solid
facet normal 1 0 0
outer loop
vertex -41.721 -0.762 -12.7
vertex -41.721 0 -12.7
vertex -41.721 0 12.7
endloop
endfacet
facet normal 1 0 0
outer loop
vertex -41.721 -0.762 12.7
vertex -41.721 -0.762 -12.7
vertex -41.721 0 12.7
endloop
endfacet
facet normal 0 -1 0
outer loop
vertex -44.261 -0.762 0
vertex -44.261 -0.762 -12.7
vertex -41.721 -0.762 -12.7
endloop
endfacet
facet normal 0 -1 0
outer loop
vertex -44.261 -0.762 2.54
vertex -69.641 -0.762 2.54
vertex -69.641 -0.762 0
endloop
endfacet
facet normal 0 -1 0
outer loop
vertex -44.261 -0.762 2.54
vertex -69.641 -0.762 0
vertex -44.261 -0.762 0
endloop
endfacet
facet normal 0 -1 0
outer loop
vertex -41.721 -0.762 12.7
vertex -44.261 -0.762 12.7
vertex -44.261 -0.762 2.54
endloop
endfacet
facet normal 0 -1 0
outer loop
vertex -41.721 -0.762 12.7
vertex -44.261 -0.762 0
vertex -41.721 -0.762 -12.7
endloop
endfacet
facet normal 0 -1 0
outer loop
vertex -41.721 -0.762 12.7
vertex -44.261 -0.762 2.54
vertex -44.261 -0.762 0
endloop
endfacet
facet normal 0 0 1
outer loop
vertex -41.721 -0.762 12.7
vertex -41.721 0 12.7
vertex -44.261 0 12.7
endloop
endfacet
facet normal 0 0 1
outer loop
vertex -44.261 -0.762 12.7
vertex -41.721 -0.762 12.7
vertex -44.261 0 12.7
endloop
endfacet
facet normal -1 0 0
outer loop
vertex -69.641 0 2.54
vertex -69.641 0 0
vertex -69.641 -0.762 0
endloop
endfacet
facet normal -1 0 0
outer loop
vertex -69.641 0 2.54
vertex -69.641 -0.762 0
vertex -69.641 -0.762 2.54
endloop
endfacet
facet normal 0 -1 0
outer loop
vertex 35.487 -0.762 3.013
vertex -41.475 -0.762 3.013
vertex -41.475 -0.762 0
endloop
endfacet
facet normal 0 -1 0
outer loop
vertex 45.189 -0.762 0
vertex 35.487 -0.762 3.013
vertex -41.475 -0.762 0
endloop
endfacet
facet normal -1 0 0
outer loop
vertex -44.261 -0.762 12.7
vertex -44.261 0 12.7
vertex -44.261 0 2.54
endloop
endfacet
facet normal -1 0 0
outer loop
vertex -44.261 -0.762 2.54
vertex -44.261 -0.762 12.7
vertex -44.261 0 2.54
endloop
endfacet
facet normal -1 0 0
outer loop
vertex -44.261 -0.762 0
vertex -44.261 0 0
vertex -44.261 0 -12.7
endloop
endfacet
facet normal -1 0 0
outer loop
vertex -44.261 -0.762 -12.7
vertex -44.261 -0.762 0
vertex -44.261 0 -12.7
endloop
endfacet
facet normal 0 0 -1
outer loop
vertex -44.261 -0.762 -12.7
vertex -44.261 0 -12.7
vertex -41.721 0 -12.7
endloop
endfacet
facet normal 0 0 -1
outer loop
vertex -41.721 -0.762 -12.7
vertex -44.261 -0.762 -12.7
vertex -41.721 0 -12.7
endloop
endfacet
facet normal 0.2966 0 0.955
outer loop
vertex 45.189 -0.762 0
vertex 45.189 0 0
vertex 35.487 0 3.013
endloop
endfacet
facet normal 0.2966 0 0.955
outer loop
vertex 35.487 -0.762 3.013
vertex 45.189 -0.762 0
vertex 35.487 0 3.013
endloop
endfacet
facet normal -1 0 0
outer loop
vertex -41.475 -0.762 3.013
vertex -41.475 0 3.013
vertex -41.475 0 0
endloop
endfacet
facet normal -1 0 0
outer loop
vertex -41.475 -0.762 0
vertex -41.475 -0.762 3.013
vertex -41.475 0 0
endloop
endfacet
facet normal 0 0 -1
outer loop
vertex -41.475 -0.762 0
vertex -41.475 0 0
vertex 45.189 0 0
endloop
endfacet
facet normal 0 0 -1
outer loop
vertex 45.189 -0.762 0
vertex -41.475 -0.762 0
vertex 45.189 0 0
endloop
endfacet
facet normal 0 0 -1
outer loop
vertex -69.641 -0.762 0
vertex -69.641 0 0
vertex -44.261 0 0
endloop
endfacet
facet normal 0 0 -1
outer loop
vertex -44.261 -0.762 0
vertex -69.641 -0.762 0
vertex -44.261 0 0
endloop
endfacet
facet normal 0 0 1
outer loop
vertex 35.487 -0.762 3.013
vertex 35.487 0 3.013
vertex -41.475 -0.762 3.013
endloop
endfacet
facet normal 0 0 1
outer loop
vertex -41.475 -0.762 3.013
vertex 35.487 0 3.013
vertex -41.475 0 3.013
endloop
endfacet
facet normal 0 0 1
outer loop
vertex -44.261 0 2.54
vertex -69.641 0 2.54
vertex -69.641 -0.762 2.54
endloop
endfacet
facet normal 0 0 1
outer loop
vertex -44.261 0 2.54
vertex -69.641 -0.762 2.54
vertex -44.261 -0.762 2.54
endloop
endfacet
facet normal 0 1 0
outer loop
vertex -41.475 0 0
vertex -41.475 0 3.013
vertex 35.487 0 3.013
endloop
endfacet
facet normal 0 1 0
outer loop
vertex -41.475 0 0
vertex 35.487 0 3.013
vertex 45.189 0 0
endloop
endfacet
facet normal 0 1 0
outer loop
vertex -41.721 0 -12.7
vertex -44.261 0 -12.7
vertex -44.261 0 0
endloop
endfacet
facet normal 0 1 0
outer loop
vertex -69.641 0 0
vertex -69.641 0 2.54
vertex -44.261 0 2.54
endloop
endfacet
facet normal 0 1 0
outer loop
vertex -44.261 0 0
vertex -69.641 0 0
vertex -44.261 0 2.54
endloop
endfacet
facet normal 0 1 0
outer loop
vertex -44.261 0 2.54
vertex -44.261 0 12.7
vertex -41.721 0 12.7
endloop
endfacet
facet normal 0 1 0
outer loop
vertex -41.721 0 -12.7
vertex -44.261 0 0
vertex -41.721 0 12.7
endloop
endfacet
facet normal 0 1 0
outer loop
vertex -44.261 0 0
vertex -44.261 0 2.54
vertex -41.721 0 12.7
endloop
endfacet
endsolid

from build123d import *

# Parameters (mm, degrees)
F3_DEPTH = 0.762
F4_DEPTH = 0.762
F0_W     = 25.4
F0_H     = 2.54
F5_DEPTH = 0.762


with BuildPart() as f3:
    # F2 (on Front) → F3 (new body)
    with BuildSketch(Plane.XZ):
        Polygon((-41.475203, 3.01335), (-41.475203, 0), (34.724797, 0), (45.189403, 0), (35.486552, 3.01335), align=None)
    extrude(amount=F3_DEPTH)


with BuildPart() as f4:
    # F1 (on Front) → F4 (new body)
    with BuildSketch(Plane.XZ):
        Polygon((-44.260852, 12.7), (-44.260852, 0), (-44.260852, -12.7), (-41.720852, -12.7), (-41.720852, 12.7), align=None)
    extrude(amount=F4_DEPTH)

    # F0 (on Front) → F5 (join)
    with BuildSketch(Plane.XZ):
        with Locations((-56.941203, 1.27)):
            Rectangle(F0_W, F0_H)
    extrude(amount=F5_DEPTH)


solid = Compound([f3.part, f4.part])
